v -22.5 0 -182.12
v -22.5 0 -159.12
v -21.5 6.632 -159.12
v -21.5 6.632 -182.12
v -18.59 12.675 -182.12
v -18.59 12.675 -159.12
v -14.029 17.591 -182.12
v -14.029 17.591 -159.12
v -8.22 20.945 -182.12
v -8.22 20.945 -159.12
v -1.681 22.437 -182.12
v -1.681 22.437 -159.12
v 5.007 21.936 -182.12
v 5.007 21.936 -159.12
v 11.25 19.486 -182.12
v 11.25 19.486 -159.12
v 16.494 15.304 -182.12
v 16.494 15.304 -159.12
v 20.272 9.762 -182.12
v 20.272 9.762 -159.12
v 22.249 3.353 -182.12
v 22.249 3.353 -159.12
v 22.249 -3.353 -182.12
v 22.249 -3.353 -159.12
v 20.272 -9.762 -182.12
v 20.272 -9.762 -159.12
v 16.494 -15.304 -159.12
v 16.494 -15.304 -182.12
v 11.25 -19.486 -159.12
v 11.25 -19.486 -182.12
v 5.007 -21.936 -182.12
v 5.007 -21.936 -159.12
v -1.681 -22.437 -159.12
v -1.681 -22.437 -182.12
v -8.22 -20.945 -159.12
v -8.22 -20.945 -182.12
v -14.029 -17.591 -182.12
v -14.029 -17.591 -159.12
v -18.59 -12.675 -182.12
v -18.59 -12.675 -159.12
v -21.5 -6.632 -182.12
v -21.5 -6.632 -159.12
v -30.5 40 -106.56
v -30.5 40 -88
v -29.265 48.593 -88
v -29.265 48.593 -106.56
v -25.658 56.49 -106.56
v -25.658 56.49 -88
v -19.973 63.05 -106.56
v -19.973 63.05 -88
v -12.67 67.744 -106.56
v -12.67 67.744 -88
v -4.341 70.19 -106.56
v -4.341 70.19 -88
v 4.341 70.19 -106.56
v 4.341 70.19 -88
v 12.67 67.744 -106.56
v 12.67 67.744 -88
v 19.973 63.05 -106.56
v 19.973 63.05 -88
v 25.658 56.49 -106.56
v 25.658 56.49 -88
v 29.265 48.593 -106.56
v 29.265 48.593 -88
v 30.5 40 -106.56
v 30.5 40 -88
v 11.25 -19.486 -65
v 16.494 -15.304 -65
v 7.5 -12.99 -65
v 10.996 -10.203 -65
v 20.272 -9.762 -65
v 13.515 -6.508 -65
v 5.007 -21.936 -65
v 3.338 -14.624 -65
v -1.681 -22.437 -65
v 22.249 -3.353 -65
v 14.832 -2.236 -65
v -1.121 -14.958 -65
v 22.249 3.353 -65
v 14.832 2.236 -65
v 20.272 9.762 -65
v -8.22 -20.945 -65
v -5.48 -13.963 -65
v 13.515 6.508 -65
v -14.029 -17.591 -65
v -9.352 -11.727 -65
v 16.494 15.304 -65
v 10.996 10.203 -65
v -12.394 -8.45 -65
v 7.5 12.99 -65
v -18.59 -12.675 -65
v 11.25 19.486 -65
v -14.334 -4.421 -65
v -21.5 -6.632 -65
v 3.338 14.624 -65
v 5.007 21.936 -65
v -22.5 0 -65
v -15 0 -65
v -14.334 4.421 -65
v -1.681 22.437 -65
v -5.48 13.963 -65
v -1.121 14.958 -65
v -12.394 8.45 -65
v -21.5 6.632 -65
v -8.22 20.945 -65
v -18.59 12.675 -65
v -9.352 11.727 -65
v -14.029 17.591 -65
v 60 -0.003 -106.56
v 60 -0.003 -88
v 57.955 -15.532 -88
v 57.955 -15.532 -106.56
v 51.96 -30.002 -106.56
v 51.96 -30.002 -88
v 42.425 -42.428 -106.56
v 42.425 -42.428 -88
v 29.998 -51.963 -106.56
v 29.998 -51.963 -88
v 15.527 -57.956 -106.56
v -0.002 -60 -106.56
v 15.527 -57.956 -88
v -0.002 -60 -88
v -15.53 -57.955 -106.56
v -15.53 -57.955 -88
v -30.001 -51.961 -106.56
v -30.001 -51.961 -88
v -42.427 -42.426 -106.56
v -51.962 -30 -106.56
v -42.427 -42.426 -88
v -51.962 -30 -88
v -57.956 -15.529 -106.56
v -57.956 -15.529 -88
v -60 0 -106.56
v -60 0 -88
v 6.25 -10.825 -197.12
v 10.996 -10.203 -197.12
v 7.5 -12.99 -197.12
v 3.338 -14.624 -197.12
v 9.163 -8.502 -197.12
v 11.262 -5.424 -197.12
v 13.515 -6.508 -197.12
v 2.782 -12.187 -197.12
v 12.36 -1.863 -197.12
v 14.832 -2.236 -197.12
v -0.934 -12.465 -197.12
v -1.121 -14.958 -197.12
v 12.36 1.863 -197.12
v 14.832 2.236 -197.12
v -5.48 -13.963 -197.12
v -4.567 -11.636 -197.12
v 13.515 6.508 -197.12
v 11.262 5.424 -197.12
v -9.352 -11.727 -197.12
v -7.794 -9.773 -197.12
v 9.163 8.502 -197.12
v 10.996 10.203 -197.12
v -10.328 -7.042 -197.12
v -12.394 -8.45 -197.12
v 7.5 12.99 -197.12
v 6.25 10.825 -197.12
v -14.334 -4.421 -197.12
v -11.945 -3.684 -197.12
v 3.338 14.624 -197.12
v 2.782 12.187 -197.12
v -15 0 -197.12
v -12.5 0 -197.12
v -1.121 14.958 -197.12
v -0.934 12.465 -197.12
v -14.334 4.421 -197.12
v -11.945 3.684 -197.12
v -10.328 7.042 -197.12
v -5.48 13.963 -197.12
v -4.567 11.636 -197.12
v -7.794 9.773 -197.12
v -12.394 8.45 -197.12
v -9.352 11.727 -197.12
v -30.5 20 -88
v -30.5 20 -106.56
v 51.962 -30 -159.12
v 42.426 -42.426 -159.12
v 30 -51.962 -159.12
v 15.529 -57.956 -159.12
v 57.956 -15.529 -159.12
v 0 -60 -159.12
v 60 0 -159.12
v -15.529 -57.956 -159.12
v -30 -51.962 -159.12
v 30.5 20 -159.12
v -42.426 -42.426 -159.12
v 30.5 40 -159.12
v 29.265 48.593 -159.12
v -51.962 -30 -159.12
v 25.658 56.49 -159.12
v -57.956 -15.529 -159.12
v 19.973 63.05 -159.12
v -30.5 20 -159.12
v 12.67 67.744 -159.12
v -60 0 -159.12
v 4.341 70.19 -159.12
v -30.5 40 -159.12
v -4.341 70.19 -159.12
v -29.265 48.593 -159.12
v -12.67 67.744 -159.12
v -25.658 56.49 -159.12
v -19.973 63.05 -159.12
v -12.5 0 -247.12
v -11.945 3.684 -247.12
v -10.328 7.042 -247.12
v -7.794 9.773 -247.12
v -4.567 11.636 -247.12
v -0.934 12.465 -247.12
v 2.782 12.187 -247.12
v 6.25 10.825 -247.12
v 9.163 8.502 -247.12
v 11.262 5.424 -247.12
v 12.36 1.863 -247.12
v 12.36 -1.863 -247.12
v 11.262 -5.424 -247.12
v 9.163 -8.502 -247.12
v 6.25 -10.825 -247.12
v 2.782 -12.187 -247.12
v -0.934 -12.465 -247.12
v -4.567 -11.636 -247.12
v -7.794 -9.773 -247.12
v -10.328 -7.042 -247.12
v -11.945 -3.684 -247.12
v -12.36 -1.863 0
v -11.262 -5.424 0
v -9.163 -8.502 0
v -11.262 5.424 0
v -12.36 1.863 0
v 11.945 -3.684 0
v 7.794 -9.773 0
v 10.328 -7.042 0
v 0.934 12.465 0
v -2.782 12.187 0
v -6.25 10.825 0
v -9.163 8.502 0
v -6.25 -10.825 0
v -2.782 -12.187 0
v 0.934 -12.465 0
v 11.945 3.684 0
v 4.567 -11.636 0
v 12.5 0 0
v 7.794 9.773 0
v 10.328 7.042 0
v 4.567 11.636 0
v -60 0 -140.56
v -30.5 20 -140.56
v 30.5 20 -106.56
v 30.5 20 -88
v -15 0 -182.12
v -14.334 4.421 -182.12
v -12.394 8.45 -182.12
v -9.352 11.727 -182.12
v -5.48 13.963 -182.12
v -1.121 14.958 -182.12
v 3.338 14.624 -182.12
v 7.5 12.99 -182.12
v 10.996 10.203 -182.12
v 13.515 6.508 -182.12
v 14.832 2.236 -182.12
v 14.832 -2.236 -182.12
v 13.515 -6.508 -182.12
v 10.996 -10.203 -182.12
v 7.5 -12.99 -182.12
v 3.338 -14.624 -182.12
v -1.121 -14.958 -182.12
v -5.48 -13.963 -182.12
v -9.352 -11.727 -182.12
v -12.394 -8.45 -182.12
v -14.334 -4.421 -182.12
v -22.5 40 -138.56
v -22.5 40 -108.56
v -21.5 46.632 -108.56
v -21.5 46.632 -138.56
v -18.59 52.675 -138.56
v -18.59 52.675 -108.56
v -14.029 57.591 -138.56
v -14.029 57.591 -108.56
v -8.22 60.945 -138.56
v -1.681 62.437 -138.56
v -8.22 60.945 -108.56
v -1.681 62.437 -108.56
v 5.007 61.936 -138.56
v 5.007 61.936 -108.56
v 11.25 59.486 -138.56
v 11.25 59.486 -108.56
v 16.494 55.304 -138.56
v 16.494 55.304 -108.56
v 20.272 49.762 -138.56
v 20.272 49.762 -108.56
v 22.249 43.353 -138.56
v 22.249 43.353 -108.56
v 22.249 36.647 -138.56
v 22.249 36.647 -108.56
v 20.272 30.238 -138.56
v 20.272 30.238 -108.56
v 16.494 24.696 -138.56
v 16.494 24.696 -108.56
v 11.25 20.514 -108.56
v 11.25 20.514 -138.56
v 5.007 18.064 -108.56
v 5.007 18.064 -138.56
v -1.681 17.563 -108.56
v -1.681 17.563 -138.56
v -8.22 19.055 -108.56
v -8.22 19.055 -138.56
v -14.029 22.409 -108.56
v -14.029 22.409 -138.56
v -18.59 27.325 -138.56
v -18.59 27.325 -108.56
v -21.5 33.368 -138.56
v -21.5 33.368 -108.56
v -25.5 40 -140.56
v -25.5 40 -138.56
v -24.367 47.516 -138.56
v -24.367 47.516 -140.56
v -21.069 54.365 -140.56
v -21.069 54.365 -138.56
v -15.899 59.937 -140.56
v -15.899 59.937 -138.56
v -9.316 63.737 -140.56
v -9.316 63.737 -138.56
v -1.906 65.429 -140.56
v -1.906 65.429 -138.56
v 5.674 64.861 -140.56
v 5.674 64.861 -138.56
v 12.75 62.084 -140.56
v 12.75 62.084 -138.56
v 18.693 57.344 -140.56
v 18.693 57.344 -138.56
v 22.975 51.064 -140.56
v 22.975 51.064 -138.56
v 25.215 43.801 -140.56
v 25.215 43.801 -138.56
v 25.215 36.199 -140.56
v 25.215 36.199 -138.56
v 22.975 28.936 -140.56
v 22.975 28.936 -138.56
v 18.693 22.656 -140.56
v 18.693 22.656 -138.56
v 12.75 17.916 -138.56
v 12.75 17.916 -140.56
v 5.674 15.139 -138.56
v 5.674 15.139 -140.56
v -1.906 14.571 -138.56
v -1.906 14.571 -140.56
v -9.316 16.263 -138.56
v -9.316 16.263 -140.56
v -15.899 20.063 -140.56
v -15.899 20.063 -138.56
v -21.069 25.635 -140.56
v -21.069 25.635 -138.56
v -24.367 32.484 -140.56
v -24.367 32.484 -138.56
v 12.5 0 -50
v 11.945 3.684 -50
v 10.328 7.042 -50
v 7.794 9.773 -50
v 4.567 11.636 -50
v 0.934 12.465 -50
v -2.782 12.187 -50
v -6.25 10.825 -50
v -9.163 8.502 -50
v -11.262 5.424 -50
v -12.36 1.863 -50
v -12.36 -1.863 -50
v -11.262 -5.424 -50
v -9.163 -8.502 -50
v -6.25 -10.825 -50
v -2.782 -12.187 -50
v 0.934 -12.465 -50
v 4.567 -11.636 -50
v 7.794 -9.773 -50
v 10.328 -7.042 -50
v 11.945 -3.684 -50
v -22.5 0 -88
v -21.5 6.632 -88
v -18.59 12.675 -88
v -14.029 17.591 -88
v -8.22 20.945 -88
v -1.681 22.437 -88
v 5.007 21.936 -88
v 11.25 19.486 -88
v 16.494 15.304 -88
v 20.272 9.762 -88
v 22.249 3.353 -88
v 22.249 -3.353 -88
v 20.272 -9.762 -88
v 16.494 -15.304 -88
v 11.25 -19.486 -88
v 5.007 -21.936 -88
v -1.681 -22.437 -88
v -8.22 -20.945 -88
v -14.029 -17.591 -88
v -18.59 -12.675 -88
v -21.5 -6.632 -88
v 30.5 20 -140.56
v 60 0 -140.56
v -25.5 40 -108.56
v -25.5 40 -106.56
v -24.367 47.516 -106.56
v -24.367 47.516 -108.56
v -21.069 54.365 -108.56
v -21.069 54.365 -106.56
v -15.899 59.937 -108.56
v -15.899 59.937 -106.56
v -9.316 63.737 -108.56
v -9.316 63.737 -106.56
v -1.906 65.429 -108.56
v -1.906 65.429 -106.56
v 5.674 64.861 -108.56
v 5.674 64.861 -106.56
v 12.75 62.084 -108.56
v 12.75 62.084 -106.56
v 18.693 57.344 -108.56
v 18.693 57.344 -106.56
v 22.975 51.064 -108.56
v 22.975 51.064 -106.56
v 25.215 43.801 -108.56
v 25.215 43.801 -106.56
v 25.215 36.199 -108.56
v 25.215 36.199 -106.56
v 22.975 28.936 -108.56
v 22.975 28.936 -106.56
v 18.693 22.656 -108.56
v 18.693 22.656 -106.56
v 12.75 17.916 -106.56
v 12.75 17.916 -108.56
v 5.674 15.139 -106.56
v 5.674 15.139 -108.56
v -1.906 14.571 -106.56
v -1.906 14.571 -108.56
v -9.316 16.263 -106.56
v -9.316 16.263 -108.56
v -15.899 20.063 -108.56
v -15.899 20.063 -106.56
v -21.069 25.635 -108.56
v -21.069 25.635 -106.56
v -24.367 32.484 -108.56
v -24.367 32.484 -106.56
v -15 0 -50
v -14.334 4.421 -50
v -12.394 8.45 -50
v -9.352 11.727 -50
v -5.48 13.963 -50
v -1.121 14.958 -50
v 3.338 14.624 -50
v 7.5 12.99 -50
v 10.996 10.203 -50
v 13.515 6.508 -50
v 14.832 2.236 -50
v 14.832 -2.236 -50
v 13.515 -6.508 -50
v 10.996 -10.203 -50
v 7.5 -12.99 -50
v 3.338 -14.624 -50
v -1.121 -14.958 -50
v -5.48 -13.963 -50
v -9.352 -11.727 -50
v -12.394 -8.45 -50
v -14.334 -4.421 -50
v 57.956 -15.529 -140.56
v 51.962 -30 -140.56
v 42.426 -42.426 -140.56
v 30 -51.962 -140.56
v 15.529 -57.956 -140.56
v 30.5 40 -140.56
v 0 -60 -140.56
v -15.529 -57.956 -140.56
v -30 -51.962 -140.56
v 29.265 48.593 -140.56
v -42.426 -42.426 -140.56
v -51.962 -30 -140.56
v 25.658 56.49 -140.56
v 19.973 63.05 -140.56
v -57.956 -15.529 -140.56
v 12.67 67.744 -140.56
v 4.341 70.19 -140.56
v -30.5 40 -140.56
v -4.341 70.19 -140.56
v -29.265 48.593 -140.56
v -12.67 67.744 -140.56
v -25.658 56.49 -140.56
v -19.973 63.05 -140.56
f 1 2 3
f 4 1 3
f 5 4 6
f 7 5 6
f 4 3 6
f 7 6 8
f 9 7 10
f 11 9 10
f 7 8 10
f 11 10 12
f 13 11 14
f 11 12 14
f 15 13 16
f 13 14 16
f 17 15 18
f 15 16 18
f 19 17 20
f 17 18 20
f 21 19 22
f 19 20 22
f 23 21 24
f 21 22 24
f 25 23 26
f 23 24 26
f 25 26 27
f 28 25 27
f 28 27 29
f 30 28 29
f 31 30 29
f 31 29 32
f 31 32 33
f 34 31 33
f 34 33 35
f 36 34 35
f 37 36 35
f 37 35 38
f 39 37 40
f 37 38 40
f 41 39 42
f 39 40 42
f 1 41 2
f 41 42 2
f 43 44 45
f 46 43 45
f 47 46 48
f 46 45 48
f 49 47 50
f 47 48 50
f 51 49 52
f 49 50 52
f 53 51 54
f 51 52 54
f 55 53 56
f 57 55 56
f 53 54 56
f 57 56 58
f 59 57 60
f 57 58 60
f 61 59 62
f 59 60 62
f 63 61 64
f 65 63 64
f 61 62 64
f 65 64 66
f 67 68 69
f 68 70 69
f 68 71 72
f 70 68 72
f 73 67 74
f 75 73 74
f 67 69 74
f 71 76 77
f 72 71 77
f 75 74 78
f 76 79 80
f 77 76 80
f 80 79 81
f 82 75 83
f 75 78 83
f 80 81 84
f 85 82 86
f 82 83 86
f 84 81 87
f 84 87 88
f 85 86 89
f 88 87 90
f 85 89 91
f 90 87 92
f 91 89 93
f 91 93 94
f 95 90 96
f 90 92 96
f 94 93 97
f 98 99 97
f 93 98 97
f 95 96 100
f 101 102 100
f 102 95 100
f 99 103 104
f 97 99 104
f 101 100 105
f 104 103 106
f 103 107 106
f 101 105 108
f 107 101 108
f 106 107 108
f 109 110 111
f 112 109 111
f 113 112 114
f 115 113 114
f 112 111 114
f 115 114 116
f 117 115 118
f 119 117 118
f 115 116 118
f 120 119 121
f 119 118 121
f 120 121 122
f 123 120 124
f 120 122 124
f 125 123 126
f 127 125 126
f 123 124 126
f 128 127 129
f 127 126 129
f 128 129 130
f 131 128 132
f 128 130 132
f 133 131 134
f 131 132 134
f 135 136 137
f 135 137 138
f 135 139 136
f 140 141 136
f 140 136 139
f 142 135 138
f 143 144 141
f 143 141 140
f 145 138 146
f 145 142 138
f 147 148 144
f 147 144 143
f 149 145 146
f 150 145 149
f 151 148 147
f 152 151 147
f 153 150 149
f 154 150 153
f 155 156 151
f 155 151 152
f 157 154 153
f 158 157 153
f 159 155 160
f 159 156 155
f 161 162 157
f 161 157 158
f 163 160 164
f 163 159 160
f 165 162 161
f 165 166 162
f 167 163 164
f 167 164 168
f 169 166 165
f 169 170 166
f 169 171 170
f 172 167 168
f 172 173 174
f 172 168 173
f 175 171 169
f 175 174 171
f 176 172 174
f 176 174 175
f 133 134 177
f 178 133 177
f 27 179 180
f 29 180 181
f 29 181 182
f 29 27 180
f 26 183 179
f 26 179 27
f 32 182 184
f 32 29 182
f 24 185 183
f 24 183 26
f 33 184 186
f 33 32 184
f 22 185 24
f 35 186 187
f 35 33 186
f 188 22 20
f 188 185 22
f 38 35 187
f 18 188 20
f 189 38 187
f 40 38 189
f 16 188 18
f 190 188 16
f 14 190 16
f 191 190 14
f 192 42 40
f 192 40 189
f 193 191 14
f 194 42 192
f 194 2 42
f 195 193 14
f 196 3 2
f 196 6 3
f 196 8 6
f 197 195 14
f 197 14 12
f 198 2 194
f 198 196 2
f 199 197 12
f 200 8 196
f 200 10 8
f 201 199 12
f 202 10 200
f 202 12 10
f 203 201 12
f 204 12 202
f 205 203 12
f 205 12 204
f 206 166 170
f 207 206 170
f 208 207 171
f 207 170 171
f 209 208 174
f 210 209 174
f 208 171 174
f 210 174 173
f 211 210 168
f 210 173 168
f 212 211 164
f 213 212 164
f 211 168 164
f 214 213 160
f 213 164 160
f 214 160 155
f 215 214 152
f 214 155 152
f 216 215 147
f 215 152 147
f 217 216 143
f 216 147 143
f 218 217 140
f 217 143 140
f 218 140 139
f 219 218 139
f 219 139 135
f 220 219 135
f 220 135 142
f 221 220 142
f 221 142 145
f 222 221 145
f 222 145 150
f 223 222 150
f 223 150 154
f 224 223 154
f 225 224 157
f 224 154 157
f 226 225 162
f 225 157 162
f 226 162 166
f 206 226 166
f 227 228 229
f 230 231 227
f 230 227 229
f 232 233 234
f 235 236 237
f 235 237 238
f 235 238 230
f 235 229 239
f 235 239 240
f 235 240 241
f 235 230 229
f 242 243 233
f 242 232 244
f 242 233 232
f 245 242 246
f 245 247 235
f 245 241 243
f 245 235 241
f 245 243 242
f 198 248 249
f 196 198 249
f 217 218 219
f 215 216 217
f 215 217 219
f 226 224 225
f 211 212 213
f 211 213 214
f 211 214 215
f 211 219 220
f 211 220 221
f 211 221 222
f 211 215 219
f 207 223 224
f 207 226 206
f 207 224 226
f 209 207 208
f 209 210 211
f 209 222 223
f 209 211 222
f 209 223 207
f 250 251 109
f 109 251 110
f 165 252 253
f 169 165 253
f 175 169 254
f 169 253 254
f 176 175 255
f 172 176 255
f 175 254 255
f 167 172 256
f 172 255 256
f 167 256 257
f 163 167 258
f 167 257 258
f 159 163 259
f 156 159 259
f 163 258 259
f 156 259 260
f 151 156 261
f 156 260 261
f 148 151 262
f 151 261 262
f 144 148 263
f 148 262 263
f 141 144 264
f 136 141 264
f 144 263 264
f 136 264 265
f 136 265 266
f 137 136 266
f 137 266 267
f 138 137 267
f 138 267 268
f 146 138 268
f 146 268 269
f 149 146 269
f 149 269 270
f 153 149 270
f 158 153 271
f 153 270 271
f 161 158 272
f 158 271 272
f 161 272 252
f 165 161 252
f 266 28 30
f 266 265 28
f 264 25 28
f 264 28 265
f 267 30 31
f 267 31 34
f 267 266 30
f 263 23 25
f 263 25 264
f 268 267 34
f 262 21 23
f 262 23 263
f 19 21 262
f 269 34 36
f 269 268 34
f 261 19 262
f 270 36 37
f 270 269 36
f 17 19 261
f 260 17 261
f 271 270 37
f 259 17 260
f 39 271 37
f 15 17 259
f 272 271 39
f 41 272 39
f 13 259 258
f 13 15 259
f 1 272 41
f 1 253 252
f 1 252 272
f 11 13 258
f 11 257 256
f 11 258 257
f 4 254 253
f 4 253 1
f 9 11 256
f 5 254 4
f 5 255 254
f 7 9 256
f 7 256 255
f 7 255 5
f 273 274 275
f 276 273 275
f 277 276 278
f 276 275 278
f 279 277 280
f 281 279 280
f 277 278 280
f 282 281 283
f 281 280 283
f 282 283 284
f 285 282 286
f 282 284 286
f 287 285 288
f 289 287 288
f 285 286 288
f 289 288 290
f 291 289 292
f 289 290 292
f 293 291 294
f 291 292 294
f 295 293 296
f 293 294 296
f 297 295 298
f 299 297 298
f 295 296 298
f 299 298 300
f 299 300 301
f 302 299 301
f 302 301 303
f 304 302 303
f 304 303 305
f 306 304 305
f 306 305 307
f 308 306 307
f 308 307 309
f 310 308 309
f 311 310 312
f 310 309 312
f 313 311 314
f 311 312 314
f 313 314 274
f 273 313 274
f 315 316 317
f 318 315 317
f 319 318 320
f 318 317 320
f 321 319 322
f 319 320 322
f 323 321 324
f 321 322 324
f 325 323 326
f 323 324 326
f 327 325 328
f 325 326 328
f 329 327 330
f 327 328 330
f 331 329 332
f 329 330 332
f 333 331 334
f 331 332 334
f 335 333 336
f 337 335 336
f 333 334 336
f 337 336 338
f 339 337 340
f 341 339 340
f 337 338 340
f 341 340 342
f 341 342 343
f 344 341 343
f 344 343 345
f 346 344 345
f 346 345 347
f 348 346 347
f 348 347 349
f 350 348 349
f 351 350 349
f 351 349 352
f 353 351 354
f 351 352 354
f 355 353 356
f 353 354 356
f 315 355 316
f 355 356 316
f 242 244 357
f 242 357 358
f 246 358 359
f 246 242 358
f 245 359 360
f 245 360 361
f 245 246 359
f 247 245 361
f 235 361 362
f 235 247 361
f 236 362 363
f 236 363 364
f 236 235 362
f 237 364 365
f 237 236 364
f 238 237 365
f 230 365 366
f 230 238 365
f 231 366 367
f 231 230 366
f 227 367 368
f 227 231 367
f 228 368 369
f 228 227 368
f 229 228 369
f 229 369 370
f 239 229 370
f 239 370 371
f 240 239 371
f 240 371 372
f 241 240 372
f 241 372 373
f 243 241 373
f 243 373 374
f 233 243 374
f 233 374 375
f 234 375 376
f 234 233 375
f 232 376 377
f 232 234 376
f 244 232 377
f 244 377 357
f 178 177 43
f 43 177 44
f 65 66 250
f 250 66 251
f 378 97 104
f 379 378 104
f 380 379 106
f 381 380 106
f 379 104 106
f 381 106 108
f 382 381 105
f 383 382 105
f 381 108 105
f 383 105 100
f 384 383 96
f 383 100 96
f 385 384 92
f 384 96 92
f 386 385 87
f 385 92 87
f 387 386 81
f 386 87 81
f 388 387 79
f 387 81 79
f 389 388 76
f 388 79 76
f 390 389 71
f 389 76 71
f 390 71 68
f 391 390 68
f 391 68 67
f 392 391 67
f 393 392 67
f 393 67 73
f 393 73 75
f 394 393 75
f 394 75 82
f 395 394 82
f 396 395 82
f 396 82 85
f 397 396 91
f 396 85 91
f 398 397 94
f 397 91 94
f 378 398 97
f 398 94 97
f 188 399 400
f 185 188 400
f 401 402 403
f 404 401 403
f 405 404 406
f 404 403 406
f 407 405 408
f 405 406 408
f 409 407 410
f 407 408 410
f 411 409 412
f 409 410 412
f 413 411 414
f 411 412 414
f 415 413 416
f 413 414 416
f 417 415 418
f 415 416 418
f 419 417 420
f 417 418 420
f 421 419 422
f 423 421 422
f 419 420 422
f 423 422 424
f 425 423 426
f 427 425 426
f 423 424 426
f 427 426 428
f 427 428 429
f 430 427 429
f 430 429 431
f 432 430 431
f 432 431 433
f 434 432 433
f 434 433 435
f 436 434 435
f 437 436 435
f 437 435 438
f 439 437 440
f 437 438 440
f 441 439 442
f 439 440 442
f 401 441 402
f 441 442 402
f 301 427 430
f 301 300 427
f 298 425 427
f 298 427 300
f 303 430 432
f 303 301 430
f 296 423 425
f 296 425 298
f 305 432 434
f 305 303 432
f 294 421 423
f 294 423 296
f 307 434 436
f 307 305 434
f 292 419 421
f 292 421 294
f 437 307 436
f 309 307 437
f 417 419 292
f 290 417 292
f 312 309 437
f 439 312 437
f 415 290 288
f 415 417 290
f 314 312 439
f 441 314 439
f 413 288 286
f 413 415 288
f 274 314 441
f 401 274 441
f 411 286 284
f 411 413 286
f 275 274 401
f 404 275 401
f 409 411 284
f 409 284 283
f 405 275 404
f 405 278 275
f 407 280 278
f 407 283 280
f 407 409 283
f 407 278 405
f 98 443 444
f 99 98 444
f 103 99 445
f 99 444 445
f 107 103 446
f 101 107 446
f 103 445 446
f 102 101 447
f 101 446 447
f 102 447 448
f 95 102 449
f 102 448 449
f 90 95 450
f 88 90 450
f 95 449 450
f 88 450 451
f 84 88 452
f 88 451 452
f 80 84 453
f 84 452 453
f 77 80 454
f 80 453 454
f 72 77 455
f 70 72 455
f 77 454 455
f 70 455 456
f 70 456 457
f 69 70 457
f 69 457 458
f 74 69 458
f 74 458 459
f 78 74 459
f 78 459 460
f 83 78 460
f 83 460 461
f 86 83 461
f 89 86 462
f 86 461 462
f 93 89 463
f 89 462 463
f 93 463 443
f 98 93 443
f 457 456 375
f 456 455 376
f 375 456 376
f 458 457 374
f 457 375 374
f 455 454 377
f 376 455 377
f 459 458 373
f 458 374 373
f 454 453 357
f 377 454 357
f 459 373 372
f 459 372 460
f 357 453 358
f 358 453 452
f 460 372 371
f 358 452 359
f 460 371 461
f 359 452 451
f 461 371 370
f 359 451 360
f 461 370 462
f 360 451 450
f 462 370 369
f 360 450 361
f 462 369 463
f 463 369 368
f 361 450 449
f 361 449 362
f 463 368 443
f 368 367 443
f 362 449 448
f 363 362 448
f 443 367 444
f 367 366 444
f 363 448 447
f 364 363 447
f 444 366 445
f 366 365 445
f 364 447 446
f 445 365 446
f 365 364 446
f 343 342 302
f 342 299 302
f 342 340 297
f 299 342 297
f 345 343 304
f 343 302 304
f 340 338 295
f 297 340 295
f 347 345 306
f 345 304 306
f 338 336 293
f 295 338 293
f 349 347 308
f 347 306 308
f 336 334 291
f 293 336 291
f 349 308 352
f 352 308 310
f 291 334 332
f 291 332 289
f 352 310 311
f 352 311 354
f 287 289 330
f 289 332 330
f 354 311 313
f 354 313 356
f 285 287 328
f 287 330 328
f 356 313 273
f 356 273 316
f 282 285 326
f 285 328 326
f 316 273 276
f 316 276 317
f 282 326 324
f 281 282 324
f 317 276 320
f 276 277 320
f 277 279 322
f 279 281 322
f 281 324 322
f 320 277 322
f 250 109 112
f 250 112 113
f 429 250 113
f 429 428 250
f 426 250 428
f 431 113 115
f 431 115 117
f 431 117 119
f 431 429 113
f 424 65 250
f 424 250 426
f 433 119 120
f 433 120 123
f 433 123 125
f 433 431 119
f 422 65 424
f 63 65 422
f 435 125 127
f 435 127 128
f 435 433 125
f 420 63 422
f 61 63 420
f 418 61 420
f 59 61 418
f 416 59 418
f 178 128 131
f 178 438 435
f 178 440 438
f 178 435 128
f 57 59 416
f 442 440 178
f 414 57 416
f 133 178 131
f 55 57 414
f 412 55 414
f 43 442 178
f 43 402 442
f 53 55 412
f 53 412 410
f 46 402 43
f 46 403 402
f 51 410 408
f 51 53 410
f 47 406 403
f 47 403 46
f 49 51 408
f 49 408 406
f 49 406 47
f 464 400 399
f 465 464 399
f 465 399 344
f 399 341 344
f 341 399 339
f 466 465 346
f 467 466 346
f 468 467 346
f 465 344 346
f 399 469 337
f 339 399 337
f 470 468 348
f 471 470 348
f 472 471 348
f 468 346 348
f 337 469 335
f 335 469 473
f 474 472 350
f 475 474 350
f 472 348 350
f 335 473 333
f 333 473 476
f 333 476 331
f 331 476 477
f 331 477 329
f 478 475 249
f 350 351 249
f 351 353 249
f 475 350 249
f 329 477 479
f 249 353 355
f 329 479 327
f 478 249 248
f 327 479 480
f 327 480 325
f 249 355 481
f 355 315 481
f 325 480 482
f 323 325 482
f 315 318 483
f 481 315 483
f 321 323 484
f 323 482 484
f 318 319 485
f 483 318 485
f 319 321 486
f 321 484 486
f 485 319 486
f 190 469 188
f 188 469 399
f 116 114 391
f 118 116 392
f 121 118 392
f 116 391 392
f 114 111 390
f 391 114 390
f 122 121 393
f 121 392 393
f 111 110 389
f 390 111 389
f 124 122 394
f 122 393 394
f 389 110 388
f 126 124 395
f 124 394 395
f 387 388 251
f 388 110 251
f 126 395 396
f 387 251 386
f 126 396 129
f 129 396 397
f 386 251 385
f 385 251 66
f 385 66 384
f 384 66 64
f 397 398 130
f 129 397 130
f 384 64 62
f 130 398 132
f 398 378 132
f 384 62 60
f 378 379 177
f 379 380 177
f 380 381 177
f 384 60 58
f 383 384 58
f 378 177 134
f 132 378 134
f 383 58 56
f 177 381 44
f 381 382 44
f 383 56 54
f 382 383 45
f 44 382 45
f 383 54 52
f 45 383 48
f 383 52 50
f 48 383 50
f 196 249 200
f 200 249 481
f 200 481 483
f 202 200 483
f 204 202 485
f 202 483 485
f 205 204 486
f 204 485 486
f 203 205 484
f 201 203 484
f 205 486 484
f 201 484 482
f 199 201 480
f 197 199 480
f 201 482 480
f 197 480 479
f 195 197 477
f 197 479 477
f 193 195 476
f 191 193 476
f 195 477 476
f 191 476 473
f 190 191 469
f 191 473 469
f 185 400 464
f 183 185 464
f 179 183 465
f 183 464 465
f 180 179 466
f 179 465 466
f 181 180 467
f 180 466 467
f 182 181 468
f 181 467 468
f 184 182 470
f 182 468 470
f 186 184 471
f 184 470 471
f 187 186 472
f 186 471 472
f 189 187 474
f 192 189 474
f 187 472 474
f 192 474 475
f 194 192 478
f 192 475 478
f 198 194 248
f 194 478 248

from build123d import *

# Parameters (mm, degrees)
SKETCH1_R            = 12.5
BOSS_EXTRUDE1_DEPTH  = 50
SKETCH3_R            = 15
BOSS_EXTRUDE2_DEPTH  = 15
SKETCH4_R            = 22.5
BOSS_EXTRUDE3_DEPTH  = 23
SKETCH5_R            = 22.5
BOSS_EXTRUDE5_DEPTH  = 18.56
SKETCH6_R            = 22.5
BOSS_EXTRUDE6_DEPTH  = 18.56
SKETCH7_R            = 25.5
BOSS_EXTRUDE7_DEPTH  = 2
SKETCH9_R            = 22.5
BOSS_EXTRUDE8_DEPTH  = 30
SKETCH11_R           = 25.5
BOSS_EXTRUDE9_DEPTH  = 2
BOSS_EXTRUDE10_DEPTH = 18.56
SKETCH13_R           = 22.5
BOSS_EXTRUDE11_DEPTH = 23
SKETCH14_R           = 15
BOSS_EXTRUDE12_DEPTH = 15
SKETCH15_R           = 12.5
BOSS_EXTRUDE13_DEPTH = 50


with BuildPart() as part:
    # Sketch1 → Boss-Extrude1 (new body)
    with BuildSketch(Plane.XY):
        Circle(SKETCH1_R)
    extrude(amount=-BOSS_EXTRUDE1_DEPTH)

    # Sketch3 → Boss-Extrude2 (add)
    with BuildSketch(Plane(origin=(0, 0, -50), x_dir=(-1, 0, 0), z_dir=(0, 0, -1))):
        Circle(SKETCH3_R)
    extrude(amount=BOSS_EXTRUDE2_DEPTH)

    # Sketch4 → Boss-Extrude3 (add)
    with BuildSketch(Plane(origin=(0, 0, -65), x_dir=(-1, 0, 0), z_dir=(0, 0, -1))):
        Circle(SKETCH4_R)
    extrude(amount=BOSS_EXTRUDE3_DEPTH)



with BuildPart() as body_2:
    # Sketch5 → Boss-Extrude5 (new body)
    with BuildSketch(Plane(origin=(0, 0, -88), x_dir=(-1, 0, 0), z_dir=(0, 0, -1))):
        with BuildLine():
            ThreePointArc((30.5, 40), (0, 70.5), (-30.5, 40))
            Line((-30.5, 40), (-30.5, 20))
            Line((-30.5, 20), (-59.999999922, -0.003051235))
            ThreePointArc((-59.999999922, -0.003051235), (0.001525617, -59.999999981), (60, 0))
            Line((60, 0), (30.5, 20))
            Line((30.5, 20), (30.5, 40))
        make_face()
        Circle(SKETCH5_R, mode=Mode.SUBTRACT)
    extrude(amount=BOSS_EXTRUDE5_DEPTH)


with BuildPart() as part_1:
    add(part.part)

    add(body_2.part)  # Boss-Extrude6 merges body 2
    # Sketch6 → Boss-Extrude6 (add)
    with BuildSketch(Plane(origin=(0, 0, -106.56), x_dir=(-1, 0, 0), z_dir=(0, 0, -1))):
        Circle(SKETCH6_R)
    extrude(amount=-BOSS_EXTRUDE6_DEPTH)

    # Sketch7 → Boss-Extrude7 (add)
    with BuildSketch(Plane(origin=(0, 0, -106.56), x_dir=(-1, 0, 0), z_dir=(0, 0, -1))):
        with Locations((0, 40)):
            Circle(SKETCH7_R)
    extrude(amount=BOSS_EXTRUDE7_DEPTH)

    # Sketch9 → Boss-Extrude8 (add)
    with BuildSketch(Plane(origin=(0, 0, -108.56), x_dir=(-1, 0, 0), z_dir=(0, 0, -1))):
        with Locations((0, 40)):
            Circle(SKETCH9_R)
    extrude(amount=BOSS_EXTRUDE8_DEPTH)

    # Sketch11 → Boss-Extrude9 (add)
    with BuildSketch(Plane(origin=(0, 0, -138.56), x_dir=(-1, 0, 0), z_dir=(0, 0, -1))):
        with Locations((0, 40)):
            Circle(SKETCH11_R)
    extrude(amount=BOSS_EXTRUDE9_DEPTH)

    # Sketch12 → Boss-Extrude10 (add)
    with BuildSketch(Plane(origin=(0, 0, -140.56), x_dir=(-1, 0, 0), z_dir=(0, 0, -1))):
        with BuildLine():
            Line((-30.5, 40), (-30.5, 20))
            Line((-30.5, 20), (-60, 0))
            ThreePointArc((-60, 0), (0, -60), (60, 0))
            Line((60, 0), (30.5, 20))
            Line((30.5, 20), (30.5, 40))
            ThreePointArc((30.5, 40), (0, 70.5), (-30.5, 40))
        make_face()
    extrude(amount=BOSS_EXTRUDE10_DEPTH)

    # Sketch13 → Boss-Extrude11 (add)
    with BuildSketch(Plane(origin=(0, 0, -159.12), x_dir=(-1, 0, 0), z_dir=(0, 0, -1))):
        Circle(SKETCH13_R)
    extrude(amount=BOSS_EXTRUDE11_DEPTH)

    # Sketch14 → Boss-Extrude12 (add)
    with BuildSketch(Plane(origin=(0, 0, -182.12), x_dir=(-1, 0, 0), z_dir=(0, 0, -1))):
        Circle(SKETCH14_R)
    extrude(amount=BOSS_EXTRUDE12_DEPTH)

    # Sketch15 → Boss-Extrude13 (add)
    with BuildSketch(Plane(origin=(0, 0, -197.12), x_dir=(-1, 0, 0), z_dir=(0, 0, -1))):
        Circle(SKETCH15_R)
    extrude(amount=BOSS_EXTRUDE13_DEPTH)


solid = part_1.part
